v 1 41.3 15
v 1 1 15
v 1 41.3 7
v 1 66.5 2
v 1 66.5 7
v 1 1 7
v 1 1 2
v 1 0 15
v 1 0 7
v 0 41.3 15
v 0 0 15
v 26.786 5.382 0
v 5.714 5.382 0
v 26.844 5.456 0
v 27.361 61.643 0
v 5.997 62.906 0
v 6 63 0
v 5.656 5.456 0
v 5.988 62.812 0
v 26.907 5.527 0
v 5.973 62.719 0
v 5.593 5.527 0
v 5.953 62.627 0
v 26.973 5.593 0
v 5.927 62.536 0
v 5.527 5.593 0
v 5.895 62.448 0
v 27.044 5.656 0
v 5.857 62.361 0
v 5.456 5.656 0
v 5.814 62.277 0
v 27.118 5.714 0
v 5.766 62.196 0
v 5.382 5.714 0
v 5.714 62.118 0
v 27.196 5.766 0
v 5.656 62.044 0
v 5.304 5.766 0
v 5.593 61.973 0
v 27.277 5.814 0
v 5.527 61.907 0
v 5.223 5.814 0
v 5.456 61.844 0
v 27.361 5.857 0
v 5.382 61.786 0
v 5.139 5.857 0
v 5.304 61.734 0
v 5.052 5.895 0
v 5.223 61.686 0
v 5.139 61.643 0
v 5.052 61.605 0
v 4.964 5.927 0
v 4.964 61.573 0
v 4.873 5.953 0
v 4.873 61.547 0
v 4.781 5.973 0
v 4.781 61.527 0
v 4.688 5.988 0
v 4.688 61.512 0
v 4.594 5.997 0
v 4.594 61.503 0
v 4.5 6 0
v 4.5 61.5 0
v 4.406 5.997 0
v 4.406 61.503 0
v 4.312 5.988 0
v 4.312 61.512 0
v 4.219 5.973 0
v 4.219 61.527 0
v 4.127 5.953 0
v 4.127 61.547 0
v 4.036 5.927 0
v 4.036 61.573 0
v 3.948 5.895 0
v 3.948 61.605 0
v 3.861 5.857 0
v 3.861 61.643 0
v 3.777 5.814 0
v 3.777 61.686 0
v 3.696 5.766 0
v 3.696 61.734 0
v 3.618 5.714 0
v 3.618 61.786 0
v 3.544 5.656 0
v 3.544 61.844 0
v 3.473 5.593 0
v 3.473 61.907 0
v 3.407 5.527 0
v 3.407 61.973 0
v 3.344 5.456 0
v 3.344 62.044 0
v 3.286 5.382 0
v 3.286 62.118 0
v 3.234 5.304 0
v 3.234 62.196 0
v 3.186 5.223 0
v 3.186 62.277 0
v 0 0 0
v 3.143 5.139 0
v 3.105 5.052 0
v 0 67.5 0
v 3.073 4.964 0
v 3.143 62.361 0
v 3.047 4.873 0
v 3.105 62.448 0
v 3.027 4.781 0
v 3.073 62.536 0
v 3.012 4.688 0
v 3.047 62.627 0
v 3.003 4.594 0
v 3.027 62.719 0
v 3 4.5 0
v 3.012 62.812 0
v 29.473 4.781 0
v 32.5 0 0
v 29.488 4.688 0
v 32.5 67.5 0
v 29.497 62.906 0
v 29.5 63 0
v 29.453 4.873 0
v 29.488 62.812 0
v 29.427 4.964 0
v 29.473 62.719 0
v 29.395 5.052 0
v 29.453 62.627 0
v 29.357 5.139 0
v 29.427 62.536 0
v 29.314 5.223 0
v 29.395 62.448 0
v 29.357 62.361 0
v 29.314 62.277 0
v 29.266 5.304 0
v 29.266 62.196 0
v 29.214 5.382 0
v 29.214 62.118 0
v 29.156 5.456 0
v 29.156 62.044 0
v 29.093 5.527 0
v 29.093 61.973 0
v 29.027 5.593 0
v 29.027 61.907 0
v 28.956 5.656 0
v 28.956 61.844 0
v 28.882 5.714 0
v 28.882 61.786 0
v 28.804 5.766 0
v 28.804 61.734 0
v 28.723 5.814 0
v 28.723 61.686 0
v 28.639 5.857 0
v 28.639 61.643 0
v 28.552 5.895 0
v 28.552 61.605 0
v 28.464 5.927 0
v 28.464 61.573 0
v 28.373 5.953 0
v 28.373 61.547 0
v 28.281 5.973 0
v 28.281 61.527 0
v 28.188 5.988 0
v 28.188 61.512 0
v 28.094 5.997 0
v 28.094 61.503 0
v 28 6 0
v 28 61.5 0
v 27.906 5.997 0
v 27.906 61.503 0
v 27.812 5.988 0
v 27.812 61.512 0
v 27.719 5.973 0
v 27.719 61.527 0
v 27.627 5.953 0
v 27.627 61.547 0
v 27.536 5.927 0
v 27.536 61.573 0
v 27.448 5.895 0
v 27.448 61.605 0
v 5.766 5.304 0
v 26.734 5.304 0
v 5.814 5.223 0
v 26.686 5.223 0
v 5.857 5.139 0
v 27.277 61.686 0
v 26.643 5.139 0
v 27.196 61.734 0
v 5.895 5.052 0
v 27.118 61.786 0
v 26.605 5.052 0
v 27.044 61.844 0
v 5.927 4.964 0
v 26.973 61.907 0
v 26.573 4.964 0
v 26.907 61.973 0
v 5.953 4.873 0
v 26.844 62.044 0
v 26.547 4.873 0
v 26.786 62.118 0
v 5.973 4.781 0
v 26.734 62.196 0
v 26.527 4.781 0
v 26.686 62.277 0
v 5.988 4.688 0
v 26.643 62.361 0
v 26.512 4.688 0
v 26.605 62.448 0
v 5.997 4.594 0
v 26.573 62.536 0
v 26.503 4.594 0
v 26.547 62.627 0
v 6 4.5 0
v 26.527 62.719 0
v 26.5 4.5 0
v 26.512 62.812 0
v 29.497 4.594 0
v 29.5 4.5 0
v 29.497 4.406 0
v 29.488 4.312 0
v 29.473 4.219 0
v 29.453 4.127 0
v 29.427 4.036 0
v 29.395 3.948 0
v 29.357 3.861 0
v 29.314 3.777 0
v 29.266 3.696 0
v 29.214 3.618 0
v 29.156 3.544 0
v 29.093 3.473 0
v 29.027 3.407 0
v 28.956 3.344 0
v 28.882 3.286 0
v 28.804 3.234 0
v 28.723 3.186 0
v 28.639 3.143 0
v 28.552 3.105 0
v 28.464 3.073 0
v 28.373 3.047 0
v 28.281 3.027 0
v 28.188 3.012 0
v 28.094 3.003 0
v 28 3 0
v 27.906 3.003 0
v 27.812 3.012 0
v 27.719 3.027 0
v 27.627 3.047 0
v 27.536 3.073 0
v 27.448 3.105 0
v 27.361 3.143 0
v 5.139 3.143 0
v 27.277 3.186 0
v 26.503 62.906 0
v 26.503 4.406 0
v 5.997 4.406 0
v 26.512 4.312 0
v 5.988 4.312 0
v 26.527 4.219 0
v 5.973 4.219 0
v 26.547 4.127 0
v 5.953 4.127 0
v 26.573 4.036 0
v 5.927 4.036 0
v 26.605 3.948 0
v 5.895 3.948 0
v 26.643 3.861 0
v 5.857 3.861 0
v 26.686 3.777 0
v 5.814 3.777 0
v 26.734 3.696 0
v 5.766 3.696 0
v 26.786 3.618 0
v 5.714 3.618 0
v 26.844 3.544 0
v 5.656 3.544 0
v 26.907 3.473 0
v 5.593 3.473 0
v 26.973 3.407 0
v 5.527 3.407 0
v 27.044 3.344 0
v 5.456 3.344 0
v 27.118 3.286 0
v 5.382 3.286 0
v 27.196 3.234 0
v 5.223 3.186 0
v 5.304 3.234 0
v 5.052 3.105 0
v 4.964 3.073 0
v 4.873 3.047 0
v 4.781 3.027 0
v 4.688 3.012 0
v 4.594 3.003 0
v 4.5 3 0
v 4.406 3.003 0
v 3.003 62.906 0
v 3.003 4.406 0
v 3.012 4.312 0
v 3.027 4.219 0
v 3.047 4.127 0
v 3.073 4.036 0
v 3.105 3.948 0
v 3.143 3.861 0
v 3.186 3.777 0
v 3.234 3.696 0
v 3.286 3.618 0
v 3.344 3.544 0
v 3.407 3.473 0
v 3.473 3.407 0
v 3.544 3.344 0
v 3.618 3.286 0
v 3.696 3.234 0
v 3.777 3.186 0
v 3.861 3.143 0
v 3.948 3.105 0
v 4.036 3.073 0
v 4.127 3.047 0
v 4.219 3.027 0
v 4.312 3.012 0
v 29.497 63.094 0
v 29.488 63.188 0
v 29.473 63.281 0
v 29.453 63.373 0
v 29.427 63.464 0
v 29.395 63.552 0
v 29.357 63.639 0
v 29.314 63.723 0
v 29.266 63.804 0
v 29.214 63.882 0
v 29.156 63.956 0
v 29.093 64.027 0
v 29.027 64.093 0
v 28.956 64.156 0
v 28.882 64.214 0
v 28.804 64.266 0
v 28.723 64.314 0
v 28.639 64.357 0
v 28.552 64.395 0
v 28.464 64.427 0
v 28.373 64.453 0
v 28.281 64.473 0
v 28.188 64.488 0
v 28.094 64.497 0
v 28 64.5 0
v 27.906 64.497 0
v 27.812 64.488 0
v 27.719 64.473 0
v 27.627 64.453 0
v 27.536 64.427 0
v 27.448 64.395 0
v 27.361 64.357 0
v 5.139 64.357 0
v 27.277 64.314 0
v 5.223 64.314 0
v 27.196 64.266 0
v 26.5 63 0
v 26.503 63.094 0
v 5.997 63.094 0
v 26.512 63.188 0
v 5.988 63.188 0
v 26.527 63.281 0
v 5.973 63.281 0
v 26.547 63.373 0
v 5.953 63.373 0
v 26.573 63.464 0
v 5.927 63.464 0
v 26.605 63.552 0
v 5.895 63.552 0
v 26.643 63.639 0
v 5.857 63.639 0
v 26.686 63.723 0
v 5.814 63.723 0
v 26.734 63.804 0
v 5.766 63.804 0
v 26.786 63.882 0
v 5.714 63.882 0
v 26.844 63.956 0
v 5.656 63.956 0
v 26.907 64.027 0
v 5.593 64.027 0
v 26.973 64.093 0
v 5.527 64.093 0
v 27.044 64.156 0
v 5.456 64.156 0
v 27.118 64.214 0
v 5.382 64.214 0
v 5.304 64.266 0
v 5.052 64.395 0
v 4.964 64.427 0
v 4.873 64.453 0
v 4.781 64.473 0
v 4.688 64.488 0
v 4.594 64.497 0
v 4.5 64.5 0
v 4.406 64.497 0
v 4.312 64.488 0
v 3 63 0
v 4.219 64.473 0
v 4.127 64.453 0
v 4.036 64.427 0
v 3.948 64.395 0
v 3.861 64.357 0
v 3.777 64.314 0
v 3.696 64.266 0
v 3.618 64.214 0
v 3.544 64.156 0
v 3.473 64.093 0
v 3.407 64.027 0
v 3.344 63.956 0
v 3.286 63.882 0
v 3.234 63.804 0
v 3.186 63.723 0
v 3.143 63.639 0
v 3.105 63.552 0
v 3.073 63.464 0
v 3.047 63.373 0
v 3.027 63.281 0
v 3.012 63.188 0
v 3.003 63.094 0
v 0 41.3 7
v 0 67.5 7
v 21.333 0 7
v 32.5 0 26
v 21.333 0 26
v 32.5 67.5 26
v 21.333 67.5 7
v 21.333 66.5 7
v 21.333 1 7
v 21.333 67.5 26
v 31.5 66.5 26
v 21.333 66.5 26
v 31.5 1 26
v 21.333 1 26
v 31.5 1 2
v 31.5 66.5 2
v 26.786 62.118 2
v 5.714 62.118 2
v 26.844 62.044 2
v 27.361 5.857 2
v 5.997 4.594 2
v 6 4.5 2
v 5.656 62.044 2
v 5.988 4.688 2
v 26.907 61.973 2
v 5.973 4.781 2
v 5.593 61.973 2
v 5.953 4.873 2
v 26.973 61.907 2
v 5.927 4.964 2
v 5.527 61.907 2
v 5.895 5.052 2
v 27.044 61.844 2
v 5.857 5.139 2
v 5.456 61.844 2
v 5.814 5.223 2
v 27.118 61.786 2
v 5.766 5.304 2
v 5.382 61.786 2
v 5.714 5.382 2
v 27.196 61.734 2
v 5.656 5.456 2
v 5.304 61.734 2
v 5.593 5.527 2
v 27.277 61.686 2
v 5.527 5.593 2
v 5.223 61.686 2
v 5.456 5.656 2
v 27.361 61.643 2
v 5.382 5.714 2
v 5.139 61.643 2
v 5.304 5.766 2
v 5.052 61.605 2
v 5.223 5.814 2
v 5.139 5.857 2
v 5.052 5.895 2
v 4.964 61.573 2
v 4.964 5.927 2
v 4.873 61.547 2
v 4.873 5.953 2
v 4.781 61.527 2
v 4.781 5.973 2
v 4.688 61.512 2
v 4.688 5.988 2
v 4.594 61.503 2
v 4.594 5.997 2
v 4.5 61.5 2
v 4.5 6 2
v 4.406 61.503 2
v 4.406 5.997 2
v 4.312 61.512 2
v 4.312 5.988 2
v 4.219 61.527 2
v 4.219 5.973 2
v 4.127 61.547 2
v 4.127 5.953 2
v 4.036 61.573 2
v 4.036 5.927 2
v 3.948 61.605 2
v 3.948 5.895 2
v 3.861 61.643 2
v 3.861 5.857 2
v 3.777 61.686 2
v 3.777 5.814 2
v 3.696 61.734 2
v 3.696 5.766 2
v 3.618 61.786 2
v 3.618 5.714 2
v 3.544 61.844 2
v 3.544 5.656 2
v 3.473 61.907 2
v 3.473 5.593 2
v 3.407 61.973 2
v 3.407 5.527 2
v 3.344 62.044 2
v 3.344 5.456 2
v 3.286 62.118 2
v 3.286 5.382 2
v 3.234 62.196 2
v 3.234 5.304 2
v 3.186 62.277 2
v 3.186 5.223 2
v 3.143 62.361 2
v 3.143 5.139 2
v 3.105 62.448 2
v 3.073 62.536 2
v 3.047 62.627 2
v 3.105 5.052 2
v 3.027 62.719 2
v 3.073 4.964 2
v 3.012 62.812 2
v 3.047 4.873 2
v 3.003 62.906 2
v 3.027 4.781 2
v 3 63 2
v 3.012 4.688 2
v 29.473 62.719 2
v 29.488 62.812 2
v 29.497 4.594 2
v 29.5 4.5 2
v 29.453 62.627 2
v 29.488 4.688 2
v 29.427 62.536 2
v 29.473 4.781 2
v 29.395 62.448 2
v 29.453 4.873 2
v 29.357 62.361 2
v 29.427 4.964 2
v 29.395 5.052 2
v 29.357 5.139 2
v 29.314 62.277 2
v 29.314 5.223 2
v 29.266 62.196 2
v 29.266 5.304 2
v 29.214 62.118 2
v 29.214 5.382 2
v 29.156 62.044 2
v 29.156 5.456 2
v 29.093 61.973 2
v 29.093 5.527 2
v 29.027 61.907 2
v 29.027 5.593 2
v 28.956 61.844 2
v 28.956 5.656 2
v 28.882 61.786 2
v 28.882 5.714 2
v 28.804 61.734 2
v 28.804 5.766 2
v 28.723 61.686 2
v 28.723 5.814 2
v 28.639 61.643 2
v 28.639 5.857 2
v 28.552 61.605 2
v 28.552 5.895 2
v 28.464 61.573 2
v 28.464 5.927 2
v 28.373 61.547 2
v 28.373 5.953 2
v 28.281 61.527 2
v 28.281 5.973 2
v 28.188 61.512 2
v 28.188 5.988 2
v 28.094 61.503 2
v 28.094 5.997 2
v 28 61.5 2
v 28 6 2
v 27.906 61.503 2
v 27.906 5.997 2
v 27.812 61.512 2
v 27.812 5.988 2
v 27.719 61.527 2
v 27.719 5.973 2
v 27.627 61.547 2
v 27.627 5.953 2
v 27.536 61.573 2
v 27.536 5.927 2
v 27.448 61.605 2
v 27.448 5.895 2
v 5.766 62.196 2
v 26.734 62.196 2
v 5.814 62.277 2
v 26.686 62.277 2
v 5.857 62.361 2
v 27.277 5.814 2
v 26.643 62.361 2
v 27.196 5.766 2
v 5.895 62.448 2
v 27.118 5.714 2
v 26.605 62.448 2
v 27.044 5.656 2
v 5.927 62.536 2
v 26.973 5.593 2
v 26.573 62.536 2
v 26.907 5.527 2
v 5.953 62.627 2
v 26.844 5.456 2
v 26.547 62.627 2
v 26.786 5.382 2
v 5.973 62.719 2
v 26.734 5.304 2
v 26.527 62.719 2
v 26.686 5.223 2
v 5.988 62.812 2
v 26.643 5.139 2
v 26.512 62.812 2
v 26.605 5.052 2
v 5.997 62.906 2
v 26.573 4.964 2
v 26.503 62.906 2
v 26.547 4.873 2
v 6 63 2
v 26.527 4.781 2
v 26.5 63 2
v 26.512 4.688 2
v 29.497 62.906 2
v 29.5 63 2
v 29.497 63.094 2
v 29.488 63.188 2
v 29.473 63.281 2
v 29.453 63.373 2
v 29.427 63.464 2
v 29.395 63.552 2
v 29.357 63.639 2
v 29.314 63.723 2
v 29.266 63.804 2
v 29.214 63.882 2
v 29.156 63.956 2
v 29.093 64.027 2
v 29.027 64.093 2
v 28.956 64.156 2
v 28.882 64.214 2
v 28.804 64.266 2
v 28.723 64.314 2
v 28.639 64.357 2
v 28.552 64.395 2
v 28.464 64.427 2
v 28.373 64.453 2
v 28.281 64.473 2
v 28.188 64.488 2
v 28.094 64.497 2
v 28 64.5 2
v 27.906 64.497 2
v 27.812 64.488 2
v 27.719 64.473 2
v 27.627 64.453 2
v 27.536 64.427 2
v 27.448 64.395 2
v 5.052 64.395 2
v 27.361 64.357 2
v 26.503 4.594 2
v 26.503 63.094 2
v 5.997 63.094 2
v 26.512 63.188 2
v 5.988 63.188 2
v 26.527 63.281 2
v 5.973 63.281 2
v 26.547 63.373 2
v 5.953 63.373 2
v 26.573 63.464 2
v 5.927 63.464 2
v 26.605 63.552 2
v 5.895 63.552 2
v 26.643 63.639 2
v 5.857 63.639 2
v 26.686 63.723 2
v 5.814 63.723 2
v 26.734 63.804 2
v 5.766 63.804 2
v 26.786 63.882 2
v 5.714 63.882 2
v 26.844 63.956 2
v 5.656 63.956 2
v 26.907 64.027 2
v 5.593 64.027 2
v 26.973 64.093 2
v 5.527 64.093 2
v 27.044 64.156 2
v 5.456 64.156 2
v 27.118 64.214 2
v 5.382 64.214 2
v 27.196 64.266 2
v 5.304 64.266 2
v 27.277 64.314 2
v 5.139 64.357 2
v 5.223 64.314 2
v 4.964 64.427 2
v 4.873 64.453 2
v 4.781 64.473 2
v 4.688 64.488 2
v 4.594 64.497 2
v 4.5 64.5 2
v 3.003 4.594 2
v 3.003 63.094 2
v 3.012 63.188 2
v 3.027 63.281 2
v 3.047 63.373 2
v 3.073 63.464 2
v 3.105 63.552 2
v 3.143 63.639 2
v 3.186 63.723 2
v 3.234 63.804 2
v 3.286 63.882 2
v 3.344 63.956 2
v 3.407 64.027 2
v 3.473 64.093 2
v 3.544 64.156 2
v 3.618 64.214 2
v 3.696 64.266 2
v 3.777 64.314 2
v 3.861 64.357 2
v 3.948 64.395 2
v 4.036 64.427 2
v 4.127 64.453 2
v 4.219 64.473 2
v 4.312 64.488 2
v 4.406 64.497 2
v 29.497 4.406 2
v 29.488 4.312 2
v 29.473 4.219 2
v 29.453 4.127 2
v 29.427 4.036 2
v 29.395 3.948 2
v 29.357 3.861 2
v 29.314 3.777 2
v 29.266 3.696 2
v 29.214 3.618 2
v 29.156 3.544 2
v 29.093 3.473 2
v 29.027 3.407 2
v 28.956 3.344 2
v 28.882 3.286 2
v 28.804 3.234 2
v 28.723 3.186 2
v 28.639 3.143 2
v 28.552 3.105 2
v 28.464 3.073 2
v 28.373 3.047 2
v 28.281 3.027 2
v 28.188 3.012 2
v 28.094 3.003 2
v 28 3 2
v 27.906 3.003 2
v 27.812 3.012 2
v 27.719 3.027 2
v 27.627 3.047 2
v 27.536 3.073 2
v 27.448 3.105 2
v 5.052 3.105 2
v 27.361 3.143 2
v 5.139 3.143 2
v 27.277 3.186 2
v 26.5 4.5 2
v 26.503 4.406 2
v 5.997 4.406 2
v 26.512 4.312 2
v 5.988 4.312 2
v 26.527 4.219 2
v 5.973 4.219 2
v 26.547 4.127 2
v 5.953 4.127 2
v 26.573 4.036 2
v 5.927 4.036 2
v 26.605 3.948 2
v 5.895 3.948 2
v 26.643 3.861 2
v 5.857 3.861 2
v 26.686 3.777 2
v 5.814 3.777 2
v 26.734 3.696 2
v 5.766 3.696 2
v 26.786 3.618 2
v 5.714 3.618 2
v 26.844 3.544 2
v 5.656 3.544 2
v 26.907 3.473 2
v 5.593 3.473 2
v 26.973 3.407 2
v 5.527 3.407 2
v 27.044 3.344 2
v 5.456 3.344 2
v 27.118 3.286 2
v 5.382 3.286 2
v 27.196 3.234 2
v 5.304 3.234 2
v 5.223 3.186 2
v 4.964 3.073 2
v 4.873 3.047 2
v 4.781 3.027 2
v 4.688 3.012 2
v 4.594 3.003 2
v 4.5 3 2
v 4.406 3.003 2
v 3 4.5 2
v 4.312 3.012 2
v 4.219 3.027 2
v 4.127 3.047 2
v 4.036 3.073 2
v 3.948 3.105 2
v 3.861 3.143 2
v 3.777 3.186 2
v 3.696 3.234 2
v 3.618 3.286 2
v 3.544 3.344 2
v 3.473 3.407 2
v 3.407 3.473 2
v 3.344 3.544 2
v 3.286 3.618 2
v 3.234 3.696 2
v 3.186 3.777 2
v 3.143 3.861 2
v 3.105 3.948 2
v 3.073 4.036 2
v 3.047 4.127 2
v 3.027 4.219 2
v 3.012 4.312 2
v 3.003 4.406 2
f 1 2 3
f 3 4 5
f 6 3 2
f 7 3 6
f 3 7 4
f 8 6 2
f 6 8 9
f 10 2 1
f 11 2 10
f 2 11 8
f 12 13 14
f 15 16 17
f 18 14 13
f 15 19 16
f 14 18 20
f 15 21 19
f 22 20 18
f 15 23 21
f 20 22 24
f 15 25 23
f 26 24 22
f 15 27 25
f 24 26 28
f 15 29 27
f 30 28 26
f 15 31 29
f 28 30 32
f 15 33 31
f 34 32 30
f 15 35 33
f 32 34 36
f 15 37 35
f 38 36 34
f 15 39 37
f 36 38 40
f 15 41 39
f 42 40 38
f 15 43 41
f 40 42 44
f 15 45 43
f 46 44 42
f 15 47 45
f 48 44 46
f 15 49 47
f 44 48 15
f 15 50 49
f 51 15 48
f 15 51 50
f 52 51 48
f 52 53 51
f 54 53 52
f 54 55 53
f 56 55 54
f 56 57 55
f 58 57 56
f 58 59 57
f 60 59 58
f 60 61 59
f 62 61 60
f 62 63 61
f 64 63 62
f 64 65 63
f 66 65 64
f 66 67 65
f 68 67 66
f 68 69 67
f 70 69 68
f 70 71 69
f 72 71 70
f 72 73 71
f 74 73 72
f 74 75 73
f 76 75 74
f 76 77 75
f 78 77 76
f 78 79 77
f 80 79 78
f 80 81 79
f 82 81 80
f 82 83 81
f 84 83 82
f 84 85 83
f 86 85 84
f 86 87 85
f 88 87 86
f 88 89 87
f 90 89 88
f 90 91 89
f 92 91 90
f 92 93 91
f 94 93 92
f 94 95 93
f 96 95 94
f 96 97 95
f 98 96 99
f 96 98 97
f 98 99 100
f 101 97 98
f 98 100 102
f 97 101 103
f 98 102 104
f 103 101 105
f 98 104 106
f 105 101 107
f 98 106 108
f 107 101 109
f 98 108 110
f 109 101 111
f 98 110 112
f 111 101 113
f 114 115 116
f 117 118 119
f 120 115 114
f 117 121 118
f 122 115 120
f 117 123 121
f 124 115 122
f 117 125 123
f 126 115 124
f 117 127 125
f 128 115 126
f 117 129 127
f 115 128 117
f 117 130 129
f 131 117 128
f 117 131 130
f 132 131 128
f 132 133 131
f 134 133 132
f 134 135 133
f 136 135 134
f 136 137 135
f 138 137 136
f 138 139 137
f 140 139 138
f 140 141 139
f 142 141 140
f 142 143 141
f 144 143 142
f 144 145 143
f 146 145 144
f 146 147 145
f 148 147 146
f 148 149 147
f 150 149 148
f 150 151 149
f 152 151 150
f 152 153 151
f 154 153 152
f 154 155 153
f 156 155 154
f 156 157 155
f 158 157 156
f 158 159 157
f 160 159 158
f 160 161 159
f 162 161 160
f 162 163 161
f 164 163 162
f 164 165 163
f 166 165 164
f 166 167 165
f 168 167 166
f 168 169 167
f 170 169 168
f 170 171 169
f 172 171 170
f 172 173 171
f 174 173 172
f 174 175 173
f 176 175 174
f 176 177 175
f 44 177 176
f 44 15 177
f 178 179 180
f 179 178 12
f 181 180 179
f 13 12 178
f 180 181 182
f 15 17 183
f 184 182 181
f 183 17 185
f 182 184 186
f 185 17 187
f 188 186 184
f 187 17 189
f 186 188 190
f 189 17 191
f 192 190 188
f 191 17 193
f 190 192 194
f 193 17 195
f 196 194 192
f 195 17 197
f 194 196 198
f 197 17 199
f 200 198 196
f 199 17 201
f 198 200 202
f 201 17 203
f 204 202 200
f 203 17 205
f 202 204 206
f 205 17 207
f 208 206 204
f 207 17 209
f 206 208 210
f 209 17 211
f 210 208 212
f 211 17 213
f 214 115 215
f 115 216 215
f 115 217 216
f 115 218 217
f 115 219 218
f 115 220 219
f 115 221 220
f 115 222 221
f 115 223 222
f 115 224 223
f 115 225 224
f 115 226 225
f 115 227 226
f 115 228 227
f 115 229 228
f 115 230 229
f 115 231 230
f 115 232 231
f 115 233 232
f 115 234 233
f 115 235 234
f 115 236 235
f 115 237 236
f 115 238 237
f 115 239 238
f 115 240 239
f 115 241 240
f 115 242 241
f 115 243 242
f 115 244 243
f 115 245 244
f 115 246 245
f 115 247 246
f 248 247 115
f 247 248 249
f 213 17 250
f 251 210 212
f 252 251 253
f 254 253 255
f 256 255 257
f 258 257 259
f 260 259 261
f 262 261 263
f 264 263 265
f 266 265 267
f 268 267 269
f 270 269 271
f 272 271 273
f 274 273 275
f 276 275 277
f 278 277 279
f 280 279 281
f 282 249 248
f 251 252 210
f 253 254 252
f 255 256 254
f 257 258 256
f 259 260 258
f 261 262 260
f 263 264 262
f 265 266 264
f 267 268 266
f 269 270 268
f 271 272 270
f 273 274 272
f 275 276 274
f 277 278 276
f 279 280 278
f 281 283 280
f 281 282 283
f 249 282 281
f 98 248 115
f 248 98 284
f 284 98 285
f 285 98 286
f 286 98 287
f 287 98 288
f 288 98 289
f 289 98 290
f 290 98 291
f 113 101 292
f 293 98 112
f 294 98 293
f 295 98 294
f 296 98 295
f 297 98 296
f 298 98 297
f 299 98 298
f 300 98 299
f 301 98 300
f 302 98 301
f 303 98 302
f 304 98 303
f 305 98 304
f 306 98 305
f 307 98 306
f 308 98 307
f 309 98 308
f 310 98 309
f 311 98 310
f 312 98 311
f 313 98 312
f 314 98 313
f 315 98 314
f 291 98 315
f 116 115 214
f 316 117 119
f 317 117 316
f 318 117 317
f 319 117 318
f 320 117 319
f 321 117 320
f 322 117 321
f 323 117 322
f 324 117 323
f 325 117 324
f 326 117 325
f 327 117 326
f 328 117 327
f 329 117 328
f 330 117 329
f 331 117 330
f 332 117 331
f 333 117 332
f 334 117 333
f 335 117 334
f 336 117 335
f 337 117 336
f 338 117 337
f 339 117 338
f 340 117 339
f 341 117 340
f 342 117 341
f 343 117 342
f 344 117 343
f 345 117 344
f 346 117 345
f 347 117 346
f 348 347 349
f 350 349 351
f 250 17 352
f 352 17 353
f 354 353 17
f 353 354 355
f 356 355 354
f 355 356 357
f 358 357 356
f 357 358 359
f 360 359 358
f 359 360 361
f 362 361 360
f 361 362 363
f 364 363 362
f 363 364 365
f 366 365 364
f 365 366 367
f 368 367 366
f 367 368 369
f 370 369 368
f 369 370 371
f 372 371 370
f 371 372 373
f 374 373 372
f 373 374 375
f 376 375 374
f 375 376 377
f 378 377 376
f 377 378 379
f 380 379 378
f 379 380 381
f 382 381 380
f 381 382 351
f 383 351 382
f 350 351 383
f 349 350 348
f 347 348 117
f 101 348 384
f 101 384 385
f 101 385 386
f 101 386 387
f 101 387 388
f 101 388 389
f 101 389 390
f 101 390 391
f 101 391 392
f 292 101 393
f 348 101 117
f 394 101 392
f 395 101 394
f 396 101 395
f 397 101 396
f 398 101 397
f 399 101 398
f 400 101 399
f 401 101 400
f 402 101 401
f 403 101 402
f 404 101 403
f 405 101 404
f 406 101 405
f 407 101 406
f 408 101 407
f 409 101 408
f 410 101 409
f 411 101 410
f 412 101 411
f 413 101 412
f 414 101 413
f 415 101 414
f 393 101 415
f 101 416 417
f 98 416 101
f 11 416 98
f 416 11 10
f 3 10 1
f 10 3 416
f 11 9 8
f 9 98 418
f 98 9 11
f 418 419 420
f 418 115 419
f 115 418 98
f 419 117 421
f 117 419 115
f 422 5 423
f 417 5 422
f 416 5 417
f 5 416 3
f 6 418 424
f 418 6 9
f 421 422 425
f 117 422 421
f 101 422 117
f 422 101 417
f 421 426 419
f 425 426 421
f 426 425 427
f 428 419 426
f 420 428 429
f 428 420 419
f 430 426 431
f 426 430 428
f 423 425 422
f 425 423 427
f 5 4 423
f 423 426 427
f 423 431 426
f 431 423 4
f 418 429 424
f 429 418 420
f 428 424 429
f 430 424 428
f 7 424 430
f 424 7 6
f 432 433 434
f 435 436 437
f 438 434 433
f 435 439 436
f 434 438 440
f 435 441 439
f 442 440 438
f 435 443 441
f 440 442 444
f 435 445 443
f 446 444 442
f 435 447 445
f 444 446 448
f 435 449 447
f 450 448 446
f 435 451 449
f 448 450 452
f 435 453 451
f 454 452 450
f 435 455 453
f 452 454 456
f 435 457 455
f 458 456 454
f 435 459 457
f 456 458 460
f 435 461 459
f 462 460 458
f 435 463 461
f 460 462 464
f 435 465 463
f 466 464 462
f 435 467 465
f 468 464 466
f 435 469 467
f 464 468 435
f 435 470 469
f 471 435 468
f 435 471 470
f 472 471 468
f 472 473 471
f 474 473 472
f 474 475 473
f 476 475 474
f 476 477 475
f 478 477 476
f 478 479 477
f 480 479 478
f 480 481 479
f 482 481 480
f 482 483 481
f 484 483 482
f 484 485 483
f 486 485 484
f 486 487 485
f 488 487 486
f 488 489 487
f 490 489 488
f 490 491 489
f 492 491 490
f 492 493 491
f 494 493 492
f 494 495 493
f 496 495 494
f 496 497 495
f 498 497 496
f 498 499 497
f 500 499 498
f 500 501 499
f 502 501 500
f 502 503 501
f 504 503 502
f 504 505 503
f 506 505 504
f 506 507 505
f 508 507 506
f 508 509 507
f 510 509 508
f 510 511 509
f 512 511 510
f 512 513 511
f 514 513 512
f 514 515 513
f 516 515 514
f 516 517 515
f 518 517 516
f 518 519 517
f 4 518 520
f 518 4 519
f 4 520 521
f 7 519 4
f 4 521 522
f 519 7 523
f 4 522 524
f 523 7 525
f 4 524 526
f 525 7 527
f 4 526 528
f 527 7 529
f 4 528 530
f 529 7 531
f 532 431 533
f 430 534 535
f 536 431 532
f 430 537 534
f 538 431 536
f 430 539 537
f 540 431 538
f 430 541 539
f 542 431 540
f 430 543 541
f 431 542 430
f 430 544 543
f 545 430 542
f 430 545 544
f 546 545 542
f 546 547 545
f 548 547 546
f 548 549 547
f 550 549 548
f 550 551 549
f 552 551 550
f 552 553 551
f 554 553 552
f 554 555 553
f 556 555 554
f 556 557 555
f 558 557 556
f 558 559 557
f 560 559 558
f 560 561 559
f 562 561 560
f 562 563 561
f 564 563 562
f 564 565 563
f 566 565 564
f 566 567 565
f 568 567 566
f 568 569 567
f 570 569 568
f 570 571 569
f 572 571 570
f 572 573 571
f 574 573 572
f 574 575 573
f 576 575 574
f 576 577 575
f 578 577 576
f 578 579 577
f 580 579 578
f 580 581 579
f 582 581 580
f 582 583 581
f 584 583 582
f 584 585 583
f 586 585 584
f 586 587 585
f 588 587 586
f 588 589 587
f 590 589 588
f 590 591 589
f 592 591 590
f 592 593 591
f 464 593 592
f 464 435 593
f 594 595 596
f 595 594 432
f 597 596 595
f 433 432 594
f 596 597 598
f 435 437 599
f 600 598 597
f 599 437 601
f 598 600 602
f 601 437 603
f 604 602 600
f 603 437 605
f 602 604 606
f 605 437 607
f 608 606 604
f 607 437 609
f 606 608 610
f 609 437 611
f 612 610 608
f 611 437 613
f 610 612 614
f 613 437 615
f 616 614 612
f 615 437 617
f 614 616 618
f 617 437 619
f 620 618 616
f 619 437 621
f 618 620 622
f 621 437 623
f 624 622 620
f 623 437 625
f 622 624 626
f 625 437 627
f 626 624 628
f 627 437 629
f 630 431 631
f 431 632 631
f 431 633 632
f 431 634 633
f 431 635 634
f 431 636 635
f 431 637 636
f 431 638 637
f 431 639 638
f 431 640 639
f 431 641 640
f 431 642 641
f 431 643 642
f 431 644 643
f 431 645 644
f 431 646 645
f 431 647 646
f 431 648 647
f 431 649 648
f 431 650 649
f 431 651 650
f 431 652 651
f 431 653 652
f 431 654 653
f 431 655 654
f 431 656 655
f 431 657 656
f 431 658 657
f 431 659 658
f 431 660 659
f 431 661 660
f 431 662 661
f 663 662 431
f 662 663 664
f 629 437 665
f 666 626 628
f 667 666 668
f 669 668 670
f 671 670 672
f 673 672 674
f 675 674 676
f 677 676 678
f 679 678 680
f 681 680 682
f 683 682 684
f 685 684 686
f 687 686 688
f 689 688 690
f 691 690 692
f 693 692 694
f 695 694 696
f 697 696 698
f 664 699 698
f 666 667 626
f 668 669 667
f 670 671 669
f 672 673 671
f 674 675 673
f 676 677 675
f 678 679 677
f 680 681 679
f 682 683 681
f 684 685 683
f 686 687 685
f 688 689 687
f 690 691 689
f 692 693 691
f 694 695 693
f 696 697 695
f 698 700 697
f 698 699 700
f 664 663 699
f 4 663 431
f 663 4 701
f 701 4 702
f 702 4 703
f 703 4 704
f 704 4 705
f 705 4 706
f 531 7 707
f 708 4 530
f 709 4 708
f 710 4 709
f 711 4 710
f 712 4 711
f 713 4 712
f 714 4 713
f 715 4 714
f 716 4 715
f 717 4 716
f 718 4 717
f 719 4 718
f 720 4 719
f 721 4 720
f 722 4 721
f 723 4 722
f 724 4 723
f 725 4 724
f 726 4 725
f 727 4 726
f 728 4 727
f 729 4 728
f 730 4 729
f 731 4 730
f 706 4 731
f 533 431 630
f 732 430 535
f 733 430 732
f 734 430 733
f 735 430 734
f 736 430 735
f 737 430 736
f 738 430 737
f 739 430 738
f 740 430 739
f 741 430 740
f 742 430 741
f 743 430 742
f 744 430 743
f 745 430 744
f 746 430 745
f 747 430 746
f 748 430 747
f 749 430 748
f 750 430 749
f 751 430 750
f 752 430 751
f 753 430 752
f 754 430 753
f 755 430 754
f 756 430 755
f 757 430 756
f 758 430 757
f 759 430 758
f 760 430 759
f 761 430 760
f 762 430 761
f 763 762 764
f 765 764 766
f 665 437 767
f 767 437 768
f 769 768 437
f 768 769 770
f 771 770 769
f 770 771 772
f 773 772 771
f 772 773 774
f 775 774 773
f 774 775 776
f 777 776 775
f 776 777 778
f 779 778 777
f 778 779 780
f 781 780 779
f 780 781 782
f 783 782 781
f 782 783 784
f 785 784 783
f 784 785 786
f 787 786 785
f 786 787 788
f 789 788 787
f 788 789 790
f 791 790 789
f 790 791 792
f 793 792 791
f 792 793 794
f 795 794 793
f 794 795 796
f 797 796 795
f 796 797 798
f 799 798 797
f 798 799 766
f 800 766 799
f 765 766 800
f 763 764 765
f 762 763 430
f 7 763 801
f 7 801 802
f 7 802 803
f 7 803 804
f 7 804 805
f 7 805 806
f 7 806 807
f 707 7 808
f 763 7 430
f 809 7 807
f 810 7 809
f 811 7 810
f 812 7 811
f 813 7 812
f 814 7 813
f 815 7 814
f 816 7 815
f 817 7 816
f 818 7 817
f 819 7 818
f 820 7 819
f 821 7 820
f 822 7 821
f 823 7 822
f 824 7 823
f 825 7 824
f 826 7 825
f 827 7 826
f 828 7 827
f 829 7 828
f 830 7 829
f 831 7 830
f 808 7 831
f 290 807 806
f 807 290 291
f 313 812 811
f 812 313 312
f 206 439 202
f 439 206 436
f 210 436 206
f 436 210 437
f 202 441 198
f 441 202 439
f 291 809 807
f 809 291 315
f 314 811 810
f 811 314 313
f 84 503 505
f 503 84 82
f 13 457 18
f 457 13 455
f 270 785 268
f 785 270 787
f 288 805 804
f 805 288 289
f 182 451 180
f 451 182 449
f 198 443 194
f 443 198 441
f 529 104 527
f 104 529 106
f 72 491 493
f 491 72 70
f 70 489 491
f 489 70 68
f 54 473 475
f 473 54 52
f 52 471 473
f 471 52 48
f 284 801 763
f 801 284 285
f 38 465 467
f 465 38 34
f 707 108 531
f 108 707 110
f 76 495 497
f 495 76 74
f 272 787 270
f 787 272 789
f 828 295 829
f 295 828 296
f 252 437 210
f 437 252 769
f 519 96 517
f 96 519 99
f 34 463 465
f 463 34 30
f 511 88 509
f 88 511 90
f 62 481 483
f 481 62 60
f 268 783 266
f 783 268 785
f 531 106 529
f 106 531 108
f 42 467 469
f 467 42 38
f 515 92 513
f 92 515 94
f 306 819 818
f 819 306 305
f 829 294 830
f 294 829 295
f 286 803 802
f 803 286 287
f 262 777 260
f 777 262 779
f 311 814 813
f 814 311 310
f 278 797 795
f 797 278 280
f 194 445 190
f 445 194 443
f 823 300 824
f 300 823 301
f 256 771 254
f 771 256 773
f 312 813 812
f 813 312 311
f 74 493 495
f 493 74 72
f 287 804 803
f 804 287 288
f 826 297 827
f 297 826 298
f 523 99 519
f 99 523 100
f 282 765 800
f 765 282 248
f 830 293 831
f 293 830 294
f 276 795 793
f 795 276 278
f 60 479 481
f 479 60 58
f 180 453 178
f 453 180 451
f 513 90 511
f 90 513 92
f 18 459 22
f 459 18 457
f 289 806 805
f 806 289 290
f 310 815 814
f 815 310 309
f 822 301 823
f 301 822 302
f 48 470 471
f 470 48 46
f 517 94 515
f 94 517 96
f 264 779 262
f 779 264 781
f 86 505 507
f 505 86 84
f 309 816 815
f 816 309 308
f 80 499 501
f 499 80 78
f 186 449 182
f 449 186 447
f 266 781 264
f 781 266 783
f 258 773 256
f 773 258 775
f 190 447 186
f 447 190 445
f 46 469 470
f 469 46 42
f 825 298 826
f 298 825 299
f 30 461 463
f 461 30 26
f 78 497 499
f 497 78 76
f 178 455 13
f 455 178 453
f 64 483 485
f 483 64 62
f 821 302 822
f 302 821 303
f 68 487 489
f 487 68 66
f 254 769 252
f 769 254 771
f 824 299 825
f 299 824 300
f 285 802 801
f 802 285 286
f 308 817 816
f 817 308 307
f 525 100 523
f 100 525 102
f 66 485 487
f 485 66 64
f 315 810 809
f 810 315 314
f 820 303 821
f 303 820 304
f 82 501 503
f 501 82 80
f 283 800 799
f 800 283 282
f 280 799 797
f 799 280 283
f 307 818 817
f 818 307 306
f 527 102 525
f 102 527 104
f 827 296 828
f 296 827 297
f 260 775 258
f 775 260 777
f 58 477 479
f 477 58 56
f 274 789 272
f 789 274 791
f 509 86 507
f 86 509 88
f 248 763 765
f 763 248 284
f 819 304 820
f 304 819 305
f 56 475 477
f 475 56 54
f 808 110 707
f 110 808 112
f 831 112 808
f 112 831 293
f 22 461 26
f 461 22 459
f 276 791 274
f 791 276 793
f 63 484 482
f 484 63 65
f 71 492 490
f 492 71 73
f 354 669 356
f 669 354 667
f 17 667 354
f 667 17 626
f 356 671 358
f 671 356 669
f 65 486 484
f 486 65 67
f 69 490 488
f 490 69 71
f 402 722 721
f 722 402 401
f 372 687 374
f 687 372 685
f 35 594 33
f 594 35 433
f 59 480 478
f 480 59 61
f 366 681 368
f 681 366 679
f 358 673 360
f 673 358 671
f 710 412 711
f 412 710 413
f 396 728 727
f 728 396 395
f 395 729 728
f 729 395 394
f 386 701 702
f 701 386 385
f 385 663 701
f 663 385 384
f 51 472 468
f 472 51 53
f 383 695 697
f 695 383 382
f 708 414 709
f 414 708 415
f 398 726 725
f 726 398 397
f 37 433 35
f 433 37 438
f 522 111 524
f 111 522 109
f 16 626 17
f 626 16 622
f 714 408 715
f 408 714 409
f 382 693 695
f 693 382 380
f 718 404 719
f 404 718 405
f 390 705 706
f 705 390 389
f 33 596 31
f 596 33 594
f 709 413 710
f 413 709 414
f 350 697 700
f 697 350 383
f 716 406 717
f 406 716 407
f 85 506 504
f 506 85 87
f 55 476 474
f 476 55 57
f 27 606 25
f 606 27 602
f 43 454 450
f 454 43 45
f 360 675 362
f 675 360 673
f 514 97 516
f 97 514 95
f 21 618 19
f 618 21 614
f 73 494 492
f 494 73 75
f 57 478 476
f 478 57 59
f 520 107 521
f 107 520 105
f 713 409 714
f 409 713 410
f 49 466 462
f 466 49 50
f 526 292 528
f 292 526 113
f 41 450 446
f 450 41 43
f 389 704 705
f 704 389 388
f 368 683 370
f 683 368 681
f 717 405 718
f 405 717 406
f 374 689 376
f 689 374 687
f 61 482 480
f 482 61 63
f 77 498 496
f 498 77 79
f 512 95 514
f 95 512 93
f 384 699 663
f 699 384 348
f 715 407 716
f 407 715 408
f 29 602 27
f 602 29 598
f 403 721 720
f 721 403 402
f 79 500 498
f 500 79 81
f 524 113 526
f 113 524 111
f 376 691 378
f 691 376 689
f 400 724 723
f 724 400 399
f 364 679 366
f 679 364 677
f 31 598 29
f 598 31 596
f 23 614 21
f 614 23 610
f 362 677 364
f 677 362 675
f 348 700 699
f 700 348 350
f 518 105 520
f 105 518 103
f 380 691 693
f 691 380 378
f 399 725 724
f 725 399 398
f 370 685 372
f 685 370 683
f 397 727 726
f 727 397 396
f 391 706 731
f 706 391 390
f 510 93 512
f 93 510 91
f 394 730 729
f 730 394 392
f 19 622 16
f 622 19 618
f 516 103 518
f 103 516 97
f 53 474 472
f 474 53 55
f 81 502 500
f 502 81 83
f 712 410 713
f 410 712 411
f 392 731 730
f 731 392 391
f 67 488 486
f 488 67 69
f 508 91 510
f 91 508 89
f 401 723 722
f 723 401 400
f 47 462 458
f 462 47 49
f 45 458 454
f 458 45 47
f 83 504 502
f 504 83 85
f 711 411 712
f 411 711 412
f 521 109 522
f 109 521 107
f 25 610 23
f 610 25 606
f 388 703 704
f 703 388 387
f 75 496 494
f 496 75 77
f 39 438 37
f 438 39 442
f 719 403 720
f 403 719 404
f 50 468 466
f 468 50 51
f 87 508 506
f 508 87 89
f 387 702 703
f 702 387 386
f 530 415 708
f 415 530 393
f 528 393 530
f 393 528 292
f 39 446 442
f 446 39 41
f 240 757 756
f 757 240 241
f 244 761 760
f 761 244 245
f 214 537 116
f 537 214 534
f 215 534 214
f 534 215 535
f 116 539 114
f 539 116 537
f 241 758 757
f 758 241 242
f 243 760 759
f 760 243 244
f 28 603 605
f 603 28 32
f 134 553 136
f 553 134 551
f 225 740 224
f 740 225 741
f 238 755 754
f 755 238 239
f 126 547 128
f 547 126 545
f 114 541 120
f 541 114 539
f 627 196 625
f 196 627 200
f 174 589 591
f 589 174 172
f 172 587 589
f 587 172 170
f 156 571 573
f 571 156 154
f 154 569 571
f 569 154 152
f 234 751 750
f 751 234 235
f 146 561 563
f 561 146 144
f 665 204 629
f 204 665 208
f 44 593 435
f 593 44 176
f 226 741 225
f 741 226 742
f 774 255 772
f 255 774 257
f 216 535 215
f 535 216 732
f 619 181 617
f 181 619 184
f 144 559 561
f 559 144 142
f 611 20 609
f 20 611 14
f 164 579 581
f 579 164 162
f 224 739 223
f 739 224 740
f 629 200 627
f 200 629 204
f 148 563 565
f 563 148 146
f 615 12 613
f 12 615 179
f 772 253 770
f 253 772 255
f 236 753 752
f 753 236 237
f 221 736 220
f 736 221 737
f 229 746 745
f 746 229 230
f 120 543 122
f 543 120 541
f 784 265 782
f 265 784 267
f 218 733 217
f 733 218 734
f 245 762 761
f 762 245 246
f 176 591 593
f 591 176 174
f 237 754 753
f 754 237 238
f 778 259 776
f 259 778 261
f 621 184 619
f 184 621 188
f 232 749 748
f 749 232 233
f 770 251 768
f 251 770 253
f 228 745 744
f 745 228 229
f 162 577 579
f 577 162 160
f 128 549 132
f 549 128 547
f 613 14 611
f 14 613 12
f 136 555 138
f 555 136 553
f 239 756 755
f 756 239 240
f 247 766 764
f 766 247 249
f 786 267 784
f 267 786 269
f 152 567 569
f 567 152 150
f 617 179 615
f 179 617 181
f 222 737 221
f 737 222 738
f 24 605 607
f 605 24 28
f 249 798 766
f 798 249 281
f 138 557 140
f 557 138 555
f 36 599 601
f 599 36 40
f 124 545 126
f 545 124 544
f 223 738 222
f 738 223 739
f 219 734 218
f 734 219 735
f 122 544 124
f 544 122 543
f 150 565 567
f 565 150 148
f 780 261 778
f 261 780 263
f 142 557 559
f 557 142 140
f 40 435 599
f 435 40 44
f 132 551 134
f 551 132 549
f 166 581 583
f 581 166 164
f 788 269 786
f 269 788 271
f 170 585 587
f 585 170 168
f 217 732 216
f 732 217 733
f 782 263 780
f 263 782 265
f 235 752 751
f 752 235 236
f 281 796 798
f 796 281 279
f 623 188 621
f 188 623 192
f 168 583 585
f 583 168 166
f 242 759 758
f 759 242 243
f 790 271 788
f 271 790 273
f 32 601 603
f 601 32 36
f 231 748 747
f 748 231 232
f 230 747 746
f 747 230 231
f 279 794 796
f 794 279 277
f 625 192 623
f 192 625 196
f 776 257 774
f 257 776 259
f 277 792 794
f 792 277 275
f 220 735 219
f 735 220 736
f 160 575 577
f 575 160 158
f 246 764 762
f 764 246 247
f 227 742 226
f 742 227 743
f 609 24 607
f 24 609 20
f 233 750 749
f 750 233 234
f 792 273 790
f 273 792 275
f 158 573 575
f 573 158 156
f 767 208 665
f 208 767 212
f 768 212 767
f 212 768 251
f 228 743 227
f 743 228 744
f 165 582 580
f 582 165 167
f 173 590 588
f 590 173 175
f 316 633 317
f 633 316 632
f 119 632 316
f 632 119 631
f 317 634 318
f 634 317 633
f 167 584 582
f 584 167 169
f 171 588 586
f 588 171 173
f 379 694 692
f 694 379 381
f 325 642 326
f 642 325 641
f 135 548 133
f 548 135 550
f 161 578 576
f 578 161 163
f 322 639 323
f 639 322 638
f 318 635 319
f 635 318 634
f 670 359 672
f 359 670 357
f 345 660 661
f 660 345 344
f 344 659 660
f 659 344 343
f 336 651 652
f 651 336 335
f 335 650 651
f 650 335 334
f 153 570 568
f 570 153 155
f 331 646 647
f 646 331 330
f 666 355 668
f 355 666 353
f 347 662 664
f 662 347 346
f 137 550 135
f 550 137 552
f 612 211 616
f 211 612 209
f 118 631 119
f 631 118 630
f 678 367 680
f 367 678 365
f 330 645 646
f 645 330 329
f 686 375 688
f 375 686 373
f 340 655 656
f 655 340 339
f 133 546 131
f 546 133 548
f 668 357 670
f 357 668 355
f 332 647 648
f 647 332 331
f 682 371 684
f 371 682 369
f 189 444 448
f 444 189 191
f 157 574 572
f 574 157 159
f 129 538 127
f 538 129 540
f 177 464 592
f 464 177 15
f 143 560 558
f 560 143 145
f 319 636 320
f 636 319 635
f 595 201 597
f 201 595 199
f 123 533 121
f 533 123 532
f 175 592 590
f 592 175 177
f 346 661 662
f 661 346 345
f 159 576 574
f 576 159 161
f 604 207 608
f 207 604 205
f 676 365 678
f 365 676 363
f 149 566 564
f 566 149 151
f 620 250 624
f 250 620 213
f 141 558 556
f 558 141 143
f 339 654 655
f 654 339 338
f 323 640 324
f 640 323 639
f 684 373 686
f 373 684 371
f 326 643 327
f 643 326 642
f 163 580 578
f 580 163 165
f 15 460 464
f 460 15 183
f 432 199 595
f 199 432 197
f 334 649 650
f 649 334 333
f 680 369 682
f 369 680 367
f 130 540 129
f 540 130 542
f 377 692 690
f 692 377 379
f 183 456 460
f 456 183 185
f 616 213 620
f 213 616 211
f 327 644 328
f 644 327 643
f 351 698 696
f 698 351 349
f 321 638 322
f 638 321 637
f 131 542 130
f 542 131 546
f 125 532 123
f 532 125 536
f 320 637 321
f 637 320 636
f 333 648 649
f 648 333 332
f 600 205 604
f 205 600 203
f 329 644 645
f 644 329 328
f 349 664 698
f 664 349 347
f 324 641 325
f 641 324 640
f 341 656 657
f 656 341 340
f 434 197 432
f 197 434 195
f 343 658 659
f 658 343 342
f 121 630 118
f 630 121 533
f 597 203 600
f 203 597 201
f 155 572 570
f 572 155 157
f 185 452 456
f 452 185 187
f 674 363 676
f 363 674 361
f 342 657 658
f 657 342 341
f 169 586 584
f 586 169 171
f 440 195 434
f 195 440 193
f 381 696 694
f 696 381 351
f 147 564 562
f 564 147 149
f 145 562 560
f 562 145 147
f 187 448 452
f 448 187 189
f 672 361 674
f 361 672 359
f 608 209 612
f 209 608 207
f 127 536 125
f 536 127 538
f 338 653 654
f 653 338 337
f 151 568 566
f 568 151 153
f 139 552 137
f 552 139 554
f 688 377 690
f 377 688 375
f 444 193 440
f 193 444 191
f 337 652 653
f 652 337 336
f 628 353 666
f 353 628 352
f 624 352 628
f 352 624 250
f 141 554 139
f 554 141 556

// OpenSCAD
$fn = 100;
screen_height = 2137;

module raspberry() {
  tolerancy = 0.5;
  raspberry_x = 30 + tolerancy;
  raspberry_y = 65 + tolerancy;
  shield_height = 26;
  screw_hole_radius = 1.5;

  translate(v=[1, 1, 2]) difference() {
      union() {

        translate(v=[-1, -1, -2]) cube(size=[1, raspberry_y * 0.60 + 2, 15], center=false);
        translate(v=[-1, -1, -2]) cube(size=[raspberry_x + 2, raspberry_y + 2, 7], center=false);
        translate(v=[raspberry_x, -1, -2]) cube(size=[1, raspberry_y + 2, shield_height], center=false);
        translate(v=[raspberry_x / 3 + raspberry_x / 3, raspberry_y, -2]) cube(size=[raspberry_x / 3, 1, shield_height], center=false);
        translate(v=[raspberry_x / 3 + raspberry_x / 3, -1, -2]) cube(size=[raspberry_x / 3, 1, shield_height], center=false);
      }
      {
        cube(size=[raspberry_x, raspberry_y, screen_height], center=false);
        translate(v=[3.5, 3.5, -5]) cylinder(h=10, r=screw_hole_radius, center=false);
        translate(v=[3.5, raspberry_y - 3.5, -5]) cylinder(h=10, r=screw_hole_radius, center=false);
        translate(v=[raspberry_x - 3.5, 3.5, -5]) cylinder(h=10, r=screw_hole_radius, center=false);
        translate(v=[raspberry_x - 3.5, raspberry_y - 3.5, -5]) cylinder(h=10, r=screw_hole_radius, center=false);
      }
    }
}
module screen() {
  color(c="gray", alpha=1.0) {
    cube(size=[112, 172, screen_height], center=false);
    translate(v=[0, 77, 0]) {
      cube(size=[133, 15, screen_height], center=false);
      translate(v=[132, -9, 0]) cube(size=[18, 32, screen_height], center=false);
    }
    translate(v=[120, 0, 0]) {
      raspberry();
    }
  }
}
module button() {
  translate(v=[5.2, 5.2, -5]) cube(size=[1, 1, 10], center=false);
  translate(v=[0, 5.2, -5]) cube(size=[1, 1, 10], center=false);
  translate(v=[5.2, 0, -5]) cube(size=[1, 1, 10], center=false);
  translate(v=[0, 0, -5]) cube(size=[1, 1, 10], center=false);
  cube(size=[6.20, 6.20, 10], center=false);
}

raspberry();
